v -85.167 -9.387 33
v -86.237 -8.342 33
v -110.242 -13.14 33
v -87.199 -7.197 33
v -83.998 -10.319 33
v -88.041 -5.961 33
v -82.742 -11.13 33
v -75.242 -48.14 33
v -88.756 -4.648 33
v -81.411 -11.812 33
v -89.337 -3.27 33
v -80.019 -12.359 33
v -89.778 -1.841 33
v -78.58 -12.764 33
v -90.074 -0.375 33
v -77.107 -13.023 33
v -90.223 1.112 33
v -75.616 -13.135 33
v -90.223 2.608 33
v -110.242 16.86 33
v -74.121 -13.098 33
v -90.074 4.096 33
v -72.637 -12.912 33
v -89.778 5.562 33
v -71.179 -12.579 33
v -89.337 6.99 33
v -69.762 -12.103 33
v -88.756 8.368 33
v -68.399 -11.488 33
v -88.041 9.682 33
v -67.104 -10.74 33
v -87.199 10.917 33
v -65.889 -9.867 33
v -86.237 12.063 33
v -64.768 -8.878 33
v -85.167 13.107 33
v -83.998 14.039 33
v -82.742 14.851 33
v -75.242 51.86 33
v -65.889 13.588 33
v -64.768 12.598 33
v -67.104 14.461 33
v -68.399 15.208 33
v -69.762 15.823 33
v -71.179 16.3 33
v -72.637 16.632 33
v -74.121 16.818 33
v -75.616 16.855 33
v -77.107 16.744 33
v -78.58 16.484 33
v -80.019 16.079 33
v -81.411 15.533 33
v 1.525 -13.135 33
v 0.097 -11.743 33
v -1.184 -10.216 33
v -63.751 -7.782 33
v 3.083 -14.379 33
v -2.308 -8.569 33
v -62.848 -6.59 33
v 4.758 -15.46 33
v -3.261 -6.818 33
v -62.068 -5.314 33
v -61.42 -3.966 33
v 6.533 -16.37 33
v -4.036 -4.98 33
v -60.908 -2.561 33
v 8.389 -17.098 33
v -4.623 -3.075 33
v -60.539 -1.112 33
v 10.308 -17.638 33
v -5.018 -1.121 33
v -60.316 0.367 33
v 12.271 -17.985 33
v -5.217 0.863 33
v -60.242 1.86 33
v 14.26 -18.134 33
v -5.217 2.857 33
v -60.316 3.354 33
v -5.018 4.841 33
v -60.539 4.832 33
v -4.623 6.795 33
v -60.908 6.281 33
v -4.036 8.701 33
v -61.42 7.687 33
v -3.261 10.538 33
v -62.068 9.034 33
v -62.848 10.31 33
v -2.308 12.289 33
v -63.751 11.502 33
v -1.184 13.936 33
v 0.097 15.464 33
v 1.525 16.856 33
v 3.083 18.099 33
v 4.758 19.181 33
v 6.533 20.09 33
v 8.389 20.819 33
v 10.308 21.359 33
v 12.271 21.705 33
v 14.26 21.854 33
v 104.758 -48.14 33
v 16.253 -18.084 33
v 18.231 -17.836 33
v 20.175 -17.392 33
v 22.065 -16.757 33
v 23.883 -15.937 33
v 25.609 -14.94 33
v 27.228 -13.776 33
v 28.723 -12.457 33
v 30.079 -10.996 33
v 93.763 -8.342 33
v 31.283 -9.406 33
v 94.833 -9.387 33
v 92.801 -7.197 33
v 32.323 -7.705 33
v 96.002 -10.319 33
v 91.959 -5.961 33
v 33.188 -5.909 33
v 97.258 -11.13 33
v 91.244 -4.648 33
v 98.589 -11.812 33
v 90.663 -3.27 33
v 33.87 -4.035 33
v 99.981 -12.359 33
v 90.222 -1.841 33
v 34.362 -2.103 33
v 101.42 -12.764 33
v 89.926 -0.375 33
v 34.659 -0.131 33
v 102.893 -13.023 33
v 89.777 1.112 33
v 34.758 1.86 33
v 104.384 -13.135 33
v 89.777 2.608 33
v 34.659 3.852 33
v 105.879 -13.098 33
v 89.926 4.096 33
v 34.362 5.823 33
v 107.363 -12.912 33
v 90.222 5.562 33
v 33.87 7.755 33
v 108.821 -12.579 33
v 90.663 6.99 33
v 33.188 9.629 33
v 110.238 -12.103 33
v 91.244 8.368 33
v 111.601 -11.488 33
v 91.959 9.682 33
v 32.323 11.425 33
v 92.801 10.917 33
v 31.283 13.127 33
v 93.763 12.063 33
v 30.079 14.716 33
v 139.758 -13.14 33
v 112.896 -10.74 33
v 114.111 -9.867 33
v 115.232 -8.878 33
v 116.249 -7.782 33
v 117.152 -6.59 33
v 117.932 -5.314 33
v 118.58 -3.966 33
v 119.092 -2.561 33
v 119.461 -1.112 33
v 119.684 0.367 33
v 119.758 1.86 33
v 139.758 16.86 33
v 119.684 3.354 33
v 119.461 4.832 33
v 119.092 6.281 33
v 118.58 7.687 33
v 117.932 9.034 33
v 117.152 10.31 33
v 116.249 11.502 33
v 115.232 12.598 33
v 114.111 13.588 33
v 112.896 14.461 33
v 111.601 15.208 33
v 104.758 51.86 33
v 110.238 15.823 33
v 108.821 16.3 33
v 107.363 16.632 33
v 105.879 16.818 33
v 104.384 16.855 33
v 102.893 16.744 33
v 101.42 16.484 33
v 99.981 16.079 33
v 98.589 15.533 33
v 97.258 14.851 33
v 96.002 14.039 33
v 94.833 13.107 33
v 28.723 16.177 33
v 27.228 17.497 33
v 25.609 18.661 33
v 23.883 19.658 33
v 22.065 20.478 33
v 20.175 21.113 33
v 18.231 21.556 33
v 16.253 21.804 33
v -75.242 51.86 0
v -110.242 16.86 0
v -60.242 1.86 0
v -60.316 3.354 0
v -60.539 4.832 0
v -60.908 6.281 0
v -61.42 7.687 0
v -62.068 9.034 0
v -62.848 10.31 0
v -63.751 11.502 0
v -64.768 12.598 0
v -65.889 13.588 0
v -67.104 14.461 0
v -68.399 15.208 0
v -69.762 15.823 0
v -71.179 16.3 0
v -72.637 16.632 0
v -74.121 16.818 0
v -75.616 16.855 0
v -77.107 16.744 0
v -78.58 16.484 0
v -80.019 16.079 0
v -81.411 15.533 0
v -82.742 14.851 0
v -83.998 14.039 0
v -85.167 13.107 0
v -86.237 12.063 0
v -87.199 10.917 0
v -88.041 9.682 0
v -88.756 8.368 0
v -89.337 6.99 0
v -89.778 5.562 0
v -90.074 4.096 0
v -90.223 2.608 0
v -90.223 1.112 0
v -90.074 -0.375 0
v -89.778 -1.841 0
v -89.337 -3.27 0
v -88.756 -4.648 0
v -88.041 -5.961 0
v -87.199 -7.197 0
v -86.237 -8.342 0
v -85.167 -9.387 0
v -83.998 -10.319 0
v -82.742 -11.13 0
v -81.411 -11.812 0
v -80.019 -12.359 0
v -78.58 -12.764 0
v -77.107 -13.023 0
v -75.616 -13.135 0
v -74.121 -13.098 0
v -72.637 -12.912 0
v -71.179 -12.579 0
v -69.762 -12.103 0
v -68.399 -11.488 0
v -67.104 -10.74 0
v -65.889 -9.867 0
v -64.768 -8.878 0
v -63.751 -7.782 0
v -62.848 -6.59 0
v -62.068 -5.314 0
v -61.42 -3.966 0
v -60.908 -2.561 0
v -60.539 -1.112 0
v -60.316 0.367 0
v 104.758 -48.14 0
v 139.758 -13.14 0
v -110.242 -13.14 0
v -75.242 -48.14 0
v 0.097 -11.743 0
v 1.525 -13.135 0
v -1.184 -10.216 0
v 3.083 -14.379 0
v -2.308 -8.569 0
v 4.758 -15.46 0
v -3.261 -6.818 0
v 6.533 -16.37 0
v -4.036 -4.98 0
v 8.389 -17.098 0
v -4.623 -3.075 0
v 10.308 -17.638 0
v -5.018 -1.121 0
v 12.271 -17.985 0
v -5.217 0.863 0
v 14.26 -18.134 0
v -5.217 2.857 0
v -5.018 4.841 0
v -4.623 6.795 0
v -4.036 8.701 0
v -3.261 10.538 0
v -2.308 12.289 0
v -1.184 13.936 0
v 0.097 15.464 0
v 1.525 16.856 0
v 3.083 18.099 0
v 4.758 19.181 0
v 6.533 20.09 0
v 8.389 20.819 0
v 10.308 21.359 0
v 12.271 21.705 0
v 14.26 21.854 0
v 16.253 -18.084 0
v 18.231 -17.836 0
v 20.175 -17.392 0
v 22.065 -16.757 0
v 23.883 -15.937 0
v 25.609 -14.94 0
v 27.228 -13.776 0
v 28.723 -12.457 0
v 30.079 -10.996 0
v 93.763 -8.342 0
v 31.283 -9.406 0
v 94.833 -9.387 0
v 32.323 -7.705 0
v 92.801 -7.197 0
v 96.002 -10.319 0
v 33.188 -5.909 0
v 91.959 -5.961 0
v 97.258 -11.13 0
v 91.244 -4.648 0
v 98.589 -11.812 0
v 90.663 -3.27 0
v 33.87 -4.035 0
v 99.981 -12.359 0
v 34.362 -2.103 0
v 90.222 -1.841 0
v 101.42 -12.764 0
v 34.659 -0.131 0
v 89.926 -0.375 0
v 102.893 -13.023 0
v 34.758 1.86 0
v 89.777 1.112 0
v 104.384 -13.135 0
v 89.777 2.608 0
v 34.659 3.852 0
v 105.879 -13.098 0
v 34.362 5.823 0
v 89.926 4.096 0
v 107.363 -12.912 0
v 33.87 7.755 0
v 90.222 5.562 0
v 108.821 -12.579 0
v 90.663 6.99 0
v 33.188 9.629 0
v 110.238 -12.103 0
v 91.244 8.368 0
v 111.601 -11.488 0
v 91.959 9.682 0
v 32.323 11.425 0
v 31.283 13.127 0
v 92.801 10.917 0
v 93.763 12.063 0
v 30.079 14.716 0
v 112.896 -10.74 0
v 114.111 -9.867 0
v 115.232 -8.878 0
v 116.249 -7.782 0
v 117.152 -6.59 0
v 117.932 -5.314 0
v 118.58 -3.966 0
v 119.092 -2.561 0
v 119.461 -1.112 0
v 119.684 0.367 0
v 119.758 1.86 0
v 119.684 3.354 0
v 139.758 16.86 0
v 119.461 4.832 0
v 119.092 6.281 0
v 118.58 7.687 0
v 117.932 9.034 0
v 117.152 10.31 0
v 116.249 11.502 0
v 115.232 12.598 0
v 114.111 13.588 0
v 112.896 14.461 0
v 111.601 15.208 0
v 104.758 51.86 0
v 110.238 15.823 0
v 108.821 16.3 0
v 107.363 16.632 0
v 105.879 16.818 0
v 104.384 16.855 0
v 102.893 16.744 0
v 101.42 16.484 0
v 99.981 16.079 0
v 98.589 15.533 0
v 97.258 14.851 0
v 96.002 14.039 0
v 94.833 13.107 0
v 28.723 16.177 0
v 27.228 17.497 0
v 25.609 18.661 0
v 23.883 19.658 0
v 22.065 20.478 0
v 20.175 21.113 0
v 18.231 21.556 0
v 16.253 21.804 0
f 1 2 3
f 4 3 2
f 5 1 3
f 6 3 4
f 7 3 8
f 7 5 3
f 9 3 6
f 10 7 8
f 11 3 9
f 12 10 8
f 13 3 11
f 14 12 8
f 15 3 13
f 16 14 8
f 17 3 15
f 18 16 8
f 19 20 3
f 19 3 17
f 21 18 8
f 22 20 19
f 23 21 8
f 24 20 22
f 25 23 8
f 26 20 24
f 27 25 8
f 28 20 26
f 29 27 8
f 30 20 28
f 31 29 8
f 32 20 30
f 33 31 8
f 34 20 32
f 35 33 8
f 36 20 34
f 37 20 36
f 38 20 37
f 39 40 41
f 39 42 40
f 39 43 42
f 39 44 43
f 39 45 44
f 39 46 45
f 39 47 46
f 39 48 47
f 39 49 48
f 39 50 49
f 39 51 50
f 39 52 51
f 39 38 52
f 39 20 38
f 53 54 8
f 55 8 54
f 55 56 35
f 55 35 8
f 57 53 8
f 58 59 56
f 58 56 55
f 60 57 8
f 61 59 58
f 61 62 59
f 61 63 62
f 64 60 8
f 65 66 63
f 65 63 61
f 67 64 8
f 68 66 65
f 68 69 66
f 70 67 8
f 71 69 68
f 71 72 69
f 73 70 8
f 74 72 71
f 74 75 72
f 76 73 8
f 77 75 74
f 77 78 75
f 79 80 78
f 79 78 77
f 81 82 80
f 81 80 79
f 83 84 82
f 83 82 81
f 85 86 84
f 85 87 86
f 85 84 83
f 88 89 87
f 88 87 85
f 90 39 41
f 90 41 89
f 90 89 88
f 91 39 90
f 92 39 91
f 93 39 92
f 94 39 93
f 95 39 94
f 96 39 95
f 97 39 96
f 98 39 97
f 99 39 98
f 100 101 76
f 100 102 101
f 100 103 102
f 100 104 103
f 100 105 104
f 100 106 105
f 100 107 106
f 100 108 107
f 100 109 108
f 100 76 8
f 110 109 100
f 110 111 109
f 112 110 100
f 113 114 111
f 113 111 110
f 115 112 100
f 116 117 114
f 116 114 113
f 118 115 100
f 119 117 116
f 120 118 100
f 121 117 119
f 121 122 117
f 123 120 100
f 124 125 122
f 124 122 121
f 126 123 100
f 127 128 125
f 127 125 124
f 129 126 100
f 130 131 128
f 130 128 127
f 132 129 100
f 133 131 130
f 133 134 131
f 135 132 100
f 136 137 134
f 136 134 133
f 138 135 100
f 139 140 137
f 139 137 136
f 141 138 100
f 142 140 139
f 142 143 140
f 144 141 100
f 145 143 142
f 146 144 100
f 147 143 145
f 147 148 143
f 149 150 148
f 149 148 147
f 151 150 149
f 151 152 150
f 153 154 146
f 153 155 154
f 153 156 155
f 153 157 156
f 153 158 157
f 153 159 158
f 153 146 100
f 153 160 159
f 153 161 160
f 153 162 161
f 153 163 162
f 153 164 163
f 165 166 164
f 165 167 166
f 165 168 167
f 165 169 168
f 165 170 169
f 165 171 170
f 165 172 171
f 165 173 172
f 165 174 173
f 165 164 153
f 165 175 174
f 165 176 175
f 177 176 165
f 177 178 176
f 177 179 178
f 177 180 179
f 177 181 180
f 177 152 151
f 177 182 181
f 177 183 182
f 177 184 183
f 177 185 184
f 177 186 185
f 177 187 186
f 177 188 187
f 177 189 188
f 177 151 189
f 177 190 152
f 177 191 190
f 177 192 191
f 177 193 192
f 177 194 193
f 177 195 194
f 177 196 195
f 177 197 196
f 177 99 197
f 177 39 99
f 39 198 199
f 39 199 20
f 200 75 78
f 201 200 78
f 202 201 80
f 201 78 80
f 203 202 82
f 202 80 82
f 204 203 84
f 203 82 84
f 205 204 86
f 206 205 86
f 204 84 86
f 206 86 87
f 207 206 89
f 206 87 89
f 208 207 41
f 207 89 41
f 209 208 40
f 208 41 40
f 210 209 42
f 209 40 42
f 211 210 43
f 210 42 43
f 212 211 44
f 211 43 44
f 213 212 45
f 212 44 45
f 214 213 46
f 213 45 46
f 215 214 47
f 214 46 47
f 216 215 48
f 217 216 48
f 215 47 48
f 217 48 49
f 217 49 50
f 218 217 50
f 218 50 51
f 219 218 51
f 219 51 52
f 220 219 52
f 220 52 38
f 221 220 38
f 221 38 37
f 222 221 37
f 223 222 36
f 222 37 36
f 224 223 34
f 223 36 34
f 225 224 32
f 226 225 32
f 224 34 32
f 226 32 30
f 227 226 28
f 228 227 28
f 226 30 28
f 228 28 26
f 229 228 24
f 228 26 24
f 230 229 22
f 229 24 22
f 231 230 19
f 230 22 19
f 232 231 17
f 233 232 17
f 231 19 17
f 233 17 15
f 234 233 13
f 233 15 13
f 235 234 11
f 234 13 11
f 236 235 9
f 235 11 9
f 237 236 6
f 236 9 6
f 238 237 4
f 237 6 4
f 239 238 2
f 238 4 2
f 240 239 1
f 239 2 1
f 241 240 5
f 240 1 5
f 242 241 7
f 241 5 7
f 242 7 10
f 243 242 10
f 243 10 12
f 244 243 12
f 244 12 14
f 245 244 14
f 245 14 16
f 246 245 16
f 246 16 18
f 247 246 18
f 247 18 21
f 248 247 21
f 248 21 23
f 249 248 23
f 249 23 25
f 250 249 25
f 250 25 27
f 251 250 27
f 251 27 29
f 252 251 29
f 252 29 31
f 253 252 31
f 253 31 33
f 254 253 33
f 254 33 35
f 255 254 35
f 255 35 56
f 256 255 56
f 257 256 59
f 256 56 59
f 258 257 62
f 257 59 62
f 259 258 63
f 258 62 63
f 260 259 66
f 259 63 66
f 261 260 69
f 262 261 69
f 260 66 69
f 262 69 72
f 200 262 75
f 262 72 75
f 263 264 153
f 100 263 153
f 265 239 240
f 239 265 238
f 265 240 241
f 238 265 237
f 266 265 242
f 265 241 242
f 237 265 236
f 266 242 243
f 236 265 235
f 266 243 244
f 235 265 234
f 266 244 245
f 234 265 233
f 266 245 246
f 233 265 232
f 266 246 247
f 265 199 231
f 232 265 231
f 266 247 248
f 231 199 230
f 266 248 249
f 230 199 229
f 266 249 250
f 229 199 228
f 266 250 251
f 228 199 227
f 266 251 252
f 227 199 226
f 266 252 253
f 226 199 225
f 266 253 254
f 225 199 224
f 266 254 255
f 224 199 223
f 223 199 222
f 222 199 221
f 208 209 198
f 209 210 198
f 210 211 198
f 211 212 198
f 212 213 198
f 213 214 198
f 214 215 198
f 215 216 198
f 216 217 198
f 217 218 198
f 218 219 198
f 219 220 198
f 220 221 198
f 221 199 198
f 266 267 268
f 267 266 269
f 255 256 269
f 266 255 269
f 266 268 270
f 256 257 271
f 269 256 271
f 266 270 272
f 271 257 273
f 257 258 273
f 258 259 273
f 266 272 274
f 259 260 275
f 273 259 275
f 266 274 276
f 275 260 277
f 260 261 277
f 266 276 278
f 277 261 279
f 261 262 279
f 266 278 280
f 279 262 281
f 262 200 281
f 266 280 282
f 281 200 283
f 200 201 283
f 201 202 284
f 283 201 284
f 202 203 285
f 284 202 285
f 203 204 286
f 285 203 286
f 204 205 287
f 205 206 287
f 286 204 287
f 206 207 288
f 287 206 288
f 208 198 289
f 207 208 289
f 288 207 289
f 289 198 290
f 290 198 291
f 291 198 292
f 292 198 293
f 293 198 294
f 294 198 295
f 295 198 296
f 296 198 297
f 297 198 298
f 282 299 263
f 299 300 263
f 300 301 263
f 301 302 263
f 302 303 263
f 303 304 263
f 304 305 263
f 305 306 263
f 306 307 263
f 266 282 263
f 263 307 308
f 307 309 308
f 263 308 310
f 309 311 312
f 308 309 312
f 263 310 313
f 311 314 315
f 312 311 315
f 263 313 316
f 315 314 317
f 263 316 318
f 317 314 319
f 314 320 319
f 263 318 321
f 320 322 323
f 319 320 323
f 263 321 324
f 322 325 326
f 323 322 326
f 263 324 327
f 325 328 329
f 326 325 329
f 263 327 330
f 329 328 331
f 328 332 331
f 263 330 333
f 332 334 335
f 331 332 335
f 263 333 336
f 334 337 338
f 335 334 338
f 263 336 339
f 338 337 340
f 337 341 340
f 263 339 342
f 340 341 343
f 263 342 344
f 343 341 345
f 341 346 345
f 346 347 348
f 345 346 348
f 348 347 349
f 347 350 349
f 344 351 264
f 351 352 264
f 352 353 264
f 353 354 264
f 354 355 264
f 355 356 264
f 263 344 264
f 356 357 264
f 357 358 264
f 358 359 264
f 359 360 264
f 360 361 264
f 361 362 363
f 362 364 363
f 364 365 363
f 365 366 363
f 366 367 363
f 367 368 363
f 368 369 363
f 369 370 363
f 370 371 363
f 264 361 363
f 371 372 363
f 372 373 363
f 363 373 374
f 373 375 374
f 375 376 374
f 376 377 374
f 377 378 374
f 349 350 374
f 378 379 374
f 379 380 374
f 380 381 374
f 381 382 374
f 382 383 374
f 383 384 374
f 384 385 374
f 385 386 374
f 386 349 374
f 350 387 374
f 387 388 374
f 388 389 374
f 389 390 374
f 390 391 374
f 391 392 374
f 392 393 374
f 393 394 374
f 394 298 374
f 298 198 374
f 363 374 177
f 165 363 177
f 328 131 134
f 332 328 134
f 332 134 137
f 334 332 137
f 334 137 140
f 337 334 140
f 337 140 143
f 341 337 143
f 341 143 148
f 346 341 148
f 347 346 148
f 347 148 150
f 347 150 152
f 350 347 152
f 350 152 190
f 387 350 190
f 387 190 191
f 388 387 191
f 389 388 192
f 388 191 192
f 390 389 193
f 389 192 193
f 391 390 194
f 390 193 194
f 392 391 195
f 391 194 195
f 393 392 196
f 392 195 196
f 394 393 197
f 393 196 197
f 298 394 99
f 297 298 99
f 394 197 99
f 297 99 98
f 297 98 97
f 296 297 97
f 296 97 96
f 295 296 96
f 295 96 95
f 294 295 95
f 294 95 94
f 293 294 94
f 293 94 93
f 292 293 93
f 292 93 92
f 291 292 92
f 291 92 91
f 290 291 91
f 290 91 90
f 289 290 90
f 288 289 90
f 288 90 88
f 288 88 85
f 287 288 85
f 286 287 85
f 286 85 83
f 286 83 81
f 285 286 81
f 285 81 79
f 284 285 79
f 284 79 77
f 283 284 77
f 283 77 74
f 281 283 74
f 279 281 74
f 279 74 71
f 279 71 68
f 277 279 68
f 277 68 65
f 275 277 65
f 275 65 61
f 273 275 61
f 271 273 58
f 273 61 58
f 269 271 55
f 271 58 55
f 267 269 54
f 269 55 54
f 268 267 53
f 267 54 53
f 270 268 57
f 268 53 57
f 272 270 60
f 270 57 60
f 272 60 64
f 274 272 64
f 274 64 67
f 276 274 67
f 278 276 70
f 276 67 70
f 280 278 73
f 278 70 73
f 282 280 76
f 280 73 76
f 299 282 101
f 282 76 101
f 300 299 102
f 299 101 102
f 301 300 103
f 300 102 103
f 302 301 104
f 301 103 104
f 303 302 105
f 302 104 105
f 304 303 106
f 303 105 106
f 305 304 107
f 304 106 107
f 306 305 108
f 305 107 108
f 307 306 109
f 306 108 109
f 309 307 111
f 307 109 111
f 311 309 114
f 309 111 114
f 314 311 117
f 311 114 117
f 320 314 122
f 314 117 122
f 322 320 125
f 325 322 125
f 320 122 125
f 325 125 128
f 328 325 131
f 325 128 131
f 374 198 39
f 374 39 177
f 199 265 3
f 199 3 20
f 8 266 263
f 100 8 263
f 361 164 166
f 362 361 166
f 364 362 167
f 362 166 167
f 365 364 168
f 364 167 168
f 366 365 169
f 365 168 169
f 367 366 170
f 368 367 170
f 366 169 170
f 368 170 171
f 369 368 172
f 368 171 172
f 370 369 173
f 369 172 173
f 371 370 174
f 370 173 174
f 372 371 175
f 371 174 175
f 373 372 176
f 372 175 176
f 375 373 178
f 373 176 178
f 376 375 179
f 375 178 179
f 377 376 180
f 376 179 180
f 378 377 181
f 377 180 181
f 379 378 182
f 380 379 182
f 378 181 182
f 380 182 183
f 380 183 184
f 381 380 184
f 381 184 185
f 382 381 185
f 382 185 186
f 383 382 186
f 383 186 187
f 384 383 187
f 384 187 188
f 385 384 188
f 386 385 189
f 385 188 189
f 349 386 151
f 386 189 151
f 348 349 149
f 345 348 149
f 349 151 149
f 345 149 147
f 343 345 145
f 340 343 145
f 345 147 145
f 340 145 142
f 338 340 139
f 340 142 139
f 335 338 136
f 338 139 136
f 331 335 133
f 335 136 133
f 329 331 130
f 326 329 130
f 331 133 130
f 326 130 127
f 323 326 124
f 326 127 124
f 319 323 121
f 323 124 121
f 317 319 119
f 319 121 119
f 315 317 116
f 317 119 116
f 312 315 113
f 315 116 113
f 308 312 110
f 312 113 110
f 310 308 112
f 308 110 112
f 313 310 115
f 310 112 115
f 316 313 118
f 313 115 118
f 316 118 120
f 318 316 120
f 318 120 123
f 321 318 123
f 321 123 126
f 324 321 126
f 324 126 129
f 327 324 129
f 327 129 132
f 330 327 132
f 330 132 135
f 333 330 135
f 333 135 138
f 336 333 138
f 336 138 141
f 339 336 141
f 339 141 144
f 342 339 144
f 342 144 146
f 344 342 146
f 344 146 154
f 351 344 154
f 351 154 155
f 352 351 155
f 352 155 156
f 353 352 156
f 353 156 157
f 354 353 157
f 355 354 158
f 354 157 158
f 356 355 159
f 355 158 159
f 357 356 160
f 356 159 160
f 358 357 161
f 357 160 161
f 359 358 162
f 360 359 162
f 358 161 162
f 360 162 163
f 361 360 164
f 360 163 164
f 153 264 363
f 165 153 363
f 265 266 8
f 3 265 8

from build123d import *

# Parameters (mm, degrees)
SKETCH1_W           = 250
SKETCH1_H           = 100
BOSS_EXTRUDE1_DEPTH = 33
CHAMFER1_SIZE       = 35
SKETCH2_R           = 20
CUT_EXTRUDE1_DEPTH  = 35
SKETCH3_R           = 15
CUT_EXTRUDE2_DEPTH  = 33
LPATTERN1_COUNT     = 2
LPATTERN1_PITCH     = 180


with BuildPart() as part:
    # Sketch1 → Boss-Extrude1 (new body)
    with BuildSketch(Plane.XY):
        with Locations((14.758290847, 1.860150752)):
            Rectangle(SKETCH1_W, SKETCH1_H)
    extrude(amount=BOSS_EXTRUDE1_DEPTH)

    # Chamfer1
    chamfer1_edges = [part.edges().sort_by_distance(p)[0] for p in [
        (-110.241709153, 51.860150752, 16.5),
        (139.758290847, 51.860150752, 16.5),
        (139.758290847, -48.139849248, 16.5),
        (-110.241709153, -48.139849248, 16.5),
    ]]
    chamfer(chamfer1_edges, length=CHAMFER1_SIZE)

    # Sketch2 → Cut-Extrude1 (cut)
    with BuildSketch(Plane.XY.offset(33)):
        with Locations((14.758290847, 1.860150752)):
            Circle(SKETCH2_R)
    extrude(amount=-CUT_EXTRUDE1_DEPTH, mode=Mode.SUBTRACT)

    # Sketch3 → Cut-Extrude2 (cut)
    with BuildSketch(Plane.XY.offset(33)):
        with Locations((104.758290847, 1.860150752)):
            Circle(SKETCH3_R)
    cut_extrude2 = extrude(amount=-CUT_EXTRUDE2_DEPTH, mode=Mode.SUBTRACT)

    # LPattern1: Cut-Extrude2 ×2
    with Locations(*[(-i * LPATTERN1_PITCH, 0, 0) for i in range(1, LPATTERN1_COUNT)]):
        add(cut_extrude2, mode=Mode.SUBTRACT)


solid = part.part
